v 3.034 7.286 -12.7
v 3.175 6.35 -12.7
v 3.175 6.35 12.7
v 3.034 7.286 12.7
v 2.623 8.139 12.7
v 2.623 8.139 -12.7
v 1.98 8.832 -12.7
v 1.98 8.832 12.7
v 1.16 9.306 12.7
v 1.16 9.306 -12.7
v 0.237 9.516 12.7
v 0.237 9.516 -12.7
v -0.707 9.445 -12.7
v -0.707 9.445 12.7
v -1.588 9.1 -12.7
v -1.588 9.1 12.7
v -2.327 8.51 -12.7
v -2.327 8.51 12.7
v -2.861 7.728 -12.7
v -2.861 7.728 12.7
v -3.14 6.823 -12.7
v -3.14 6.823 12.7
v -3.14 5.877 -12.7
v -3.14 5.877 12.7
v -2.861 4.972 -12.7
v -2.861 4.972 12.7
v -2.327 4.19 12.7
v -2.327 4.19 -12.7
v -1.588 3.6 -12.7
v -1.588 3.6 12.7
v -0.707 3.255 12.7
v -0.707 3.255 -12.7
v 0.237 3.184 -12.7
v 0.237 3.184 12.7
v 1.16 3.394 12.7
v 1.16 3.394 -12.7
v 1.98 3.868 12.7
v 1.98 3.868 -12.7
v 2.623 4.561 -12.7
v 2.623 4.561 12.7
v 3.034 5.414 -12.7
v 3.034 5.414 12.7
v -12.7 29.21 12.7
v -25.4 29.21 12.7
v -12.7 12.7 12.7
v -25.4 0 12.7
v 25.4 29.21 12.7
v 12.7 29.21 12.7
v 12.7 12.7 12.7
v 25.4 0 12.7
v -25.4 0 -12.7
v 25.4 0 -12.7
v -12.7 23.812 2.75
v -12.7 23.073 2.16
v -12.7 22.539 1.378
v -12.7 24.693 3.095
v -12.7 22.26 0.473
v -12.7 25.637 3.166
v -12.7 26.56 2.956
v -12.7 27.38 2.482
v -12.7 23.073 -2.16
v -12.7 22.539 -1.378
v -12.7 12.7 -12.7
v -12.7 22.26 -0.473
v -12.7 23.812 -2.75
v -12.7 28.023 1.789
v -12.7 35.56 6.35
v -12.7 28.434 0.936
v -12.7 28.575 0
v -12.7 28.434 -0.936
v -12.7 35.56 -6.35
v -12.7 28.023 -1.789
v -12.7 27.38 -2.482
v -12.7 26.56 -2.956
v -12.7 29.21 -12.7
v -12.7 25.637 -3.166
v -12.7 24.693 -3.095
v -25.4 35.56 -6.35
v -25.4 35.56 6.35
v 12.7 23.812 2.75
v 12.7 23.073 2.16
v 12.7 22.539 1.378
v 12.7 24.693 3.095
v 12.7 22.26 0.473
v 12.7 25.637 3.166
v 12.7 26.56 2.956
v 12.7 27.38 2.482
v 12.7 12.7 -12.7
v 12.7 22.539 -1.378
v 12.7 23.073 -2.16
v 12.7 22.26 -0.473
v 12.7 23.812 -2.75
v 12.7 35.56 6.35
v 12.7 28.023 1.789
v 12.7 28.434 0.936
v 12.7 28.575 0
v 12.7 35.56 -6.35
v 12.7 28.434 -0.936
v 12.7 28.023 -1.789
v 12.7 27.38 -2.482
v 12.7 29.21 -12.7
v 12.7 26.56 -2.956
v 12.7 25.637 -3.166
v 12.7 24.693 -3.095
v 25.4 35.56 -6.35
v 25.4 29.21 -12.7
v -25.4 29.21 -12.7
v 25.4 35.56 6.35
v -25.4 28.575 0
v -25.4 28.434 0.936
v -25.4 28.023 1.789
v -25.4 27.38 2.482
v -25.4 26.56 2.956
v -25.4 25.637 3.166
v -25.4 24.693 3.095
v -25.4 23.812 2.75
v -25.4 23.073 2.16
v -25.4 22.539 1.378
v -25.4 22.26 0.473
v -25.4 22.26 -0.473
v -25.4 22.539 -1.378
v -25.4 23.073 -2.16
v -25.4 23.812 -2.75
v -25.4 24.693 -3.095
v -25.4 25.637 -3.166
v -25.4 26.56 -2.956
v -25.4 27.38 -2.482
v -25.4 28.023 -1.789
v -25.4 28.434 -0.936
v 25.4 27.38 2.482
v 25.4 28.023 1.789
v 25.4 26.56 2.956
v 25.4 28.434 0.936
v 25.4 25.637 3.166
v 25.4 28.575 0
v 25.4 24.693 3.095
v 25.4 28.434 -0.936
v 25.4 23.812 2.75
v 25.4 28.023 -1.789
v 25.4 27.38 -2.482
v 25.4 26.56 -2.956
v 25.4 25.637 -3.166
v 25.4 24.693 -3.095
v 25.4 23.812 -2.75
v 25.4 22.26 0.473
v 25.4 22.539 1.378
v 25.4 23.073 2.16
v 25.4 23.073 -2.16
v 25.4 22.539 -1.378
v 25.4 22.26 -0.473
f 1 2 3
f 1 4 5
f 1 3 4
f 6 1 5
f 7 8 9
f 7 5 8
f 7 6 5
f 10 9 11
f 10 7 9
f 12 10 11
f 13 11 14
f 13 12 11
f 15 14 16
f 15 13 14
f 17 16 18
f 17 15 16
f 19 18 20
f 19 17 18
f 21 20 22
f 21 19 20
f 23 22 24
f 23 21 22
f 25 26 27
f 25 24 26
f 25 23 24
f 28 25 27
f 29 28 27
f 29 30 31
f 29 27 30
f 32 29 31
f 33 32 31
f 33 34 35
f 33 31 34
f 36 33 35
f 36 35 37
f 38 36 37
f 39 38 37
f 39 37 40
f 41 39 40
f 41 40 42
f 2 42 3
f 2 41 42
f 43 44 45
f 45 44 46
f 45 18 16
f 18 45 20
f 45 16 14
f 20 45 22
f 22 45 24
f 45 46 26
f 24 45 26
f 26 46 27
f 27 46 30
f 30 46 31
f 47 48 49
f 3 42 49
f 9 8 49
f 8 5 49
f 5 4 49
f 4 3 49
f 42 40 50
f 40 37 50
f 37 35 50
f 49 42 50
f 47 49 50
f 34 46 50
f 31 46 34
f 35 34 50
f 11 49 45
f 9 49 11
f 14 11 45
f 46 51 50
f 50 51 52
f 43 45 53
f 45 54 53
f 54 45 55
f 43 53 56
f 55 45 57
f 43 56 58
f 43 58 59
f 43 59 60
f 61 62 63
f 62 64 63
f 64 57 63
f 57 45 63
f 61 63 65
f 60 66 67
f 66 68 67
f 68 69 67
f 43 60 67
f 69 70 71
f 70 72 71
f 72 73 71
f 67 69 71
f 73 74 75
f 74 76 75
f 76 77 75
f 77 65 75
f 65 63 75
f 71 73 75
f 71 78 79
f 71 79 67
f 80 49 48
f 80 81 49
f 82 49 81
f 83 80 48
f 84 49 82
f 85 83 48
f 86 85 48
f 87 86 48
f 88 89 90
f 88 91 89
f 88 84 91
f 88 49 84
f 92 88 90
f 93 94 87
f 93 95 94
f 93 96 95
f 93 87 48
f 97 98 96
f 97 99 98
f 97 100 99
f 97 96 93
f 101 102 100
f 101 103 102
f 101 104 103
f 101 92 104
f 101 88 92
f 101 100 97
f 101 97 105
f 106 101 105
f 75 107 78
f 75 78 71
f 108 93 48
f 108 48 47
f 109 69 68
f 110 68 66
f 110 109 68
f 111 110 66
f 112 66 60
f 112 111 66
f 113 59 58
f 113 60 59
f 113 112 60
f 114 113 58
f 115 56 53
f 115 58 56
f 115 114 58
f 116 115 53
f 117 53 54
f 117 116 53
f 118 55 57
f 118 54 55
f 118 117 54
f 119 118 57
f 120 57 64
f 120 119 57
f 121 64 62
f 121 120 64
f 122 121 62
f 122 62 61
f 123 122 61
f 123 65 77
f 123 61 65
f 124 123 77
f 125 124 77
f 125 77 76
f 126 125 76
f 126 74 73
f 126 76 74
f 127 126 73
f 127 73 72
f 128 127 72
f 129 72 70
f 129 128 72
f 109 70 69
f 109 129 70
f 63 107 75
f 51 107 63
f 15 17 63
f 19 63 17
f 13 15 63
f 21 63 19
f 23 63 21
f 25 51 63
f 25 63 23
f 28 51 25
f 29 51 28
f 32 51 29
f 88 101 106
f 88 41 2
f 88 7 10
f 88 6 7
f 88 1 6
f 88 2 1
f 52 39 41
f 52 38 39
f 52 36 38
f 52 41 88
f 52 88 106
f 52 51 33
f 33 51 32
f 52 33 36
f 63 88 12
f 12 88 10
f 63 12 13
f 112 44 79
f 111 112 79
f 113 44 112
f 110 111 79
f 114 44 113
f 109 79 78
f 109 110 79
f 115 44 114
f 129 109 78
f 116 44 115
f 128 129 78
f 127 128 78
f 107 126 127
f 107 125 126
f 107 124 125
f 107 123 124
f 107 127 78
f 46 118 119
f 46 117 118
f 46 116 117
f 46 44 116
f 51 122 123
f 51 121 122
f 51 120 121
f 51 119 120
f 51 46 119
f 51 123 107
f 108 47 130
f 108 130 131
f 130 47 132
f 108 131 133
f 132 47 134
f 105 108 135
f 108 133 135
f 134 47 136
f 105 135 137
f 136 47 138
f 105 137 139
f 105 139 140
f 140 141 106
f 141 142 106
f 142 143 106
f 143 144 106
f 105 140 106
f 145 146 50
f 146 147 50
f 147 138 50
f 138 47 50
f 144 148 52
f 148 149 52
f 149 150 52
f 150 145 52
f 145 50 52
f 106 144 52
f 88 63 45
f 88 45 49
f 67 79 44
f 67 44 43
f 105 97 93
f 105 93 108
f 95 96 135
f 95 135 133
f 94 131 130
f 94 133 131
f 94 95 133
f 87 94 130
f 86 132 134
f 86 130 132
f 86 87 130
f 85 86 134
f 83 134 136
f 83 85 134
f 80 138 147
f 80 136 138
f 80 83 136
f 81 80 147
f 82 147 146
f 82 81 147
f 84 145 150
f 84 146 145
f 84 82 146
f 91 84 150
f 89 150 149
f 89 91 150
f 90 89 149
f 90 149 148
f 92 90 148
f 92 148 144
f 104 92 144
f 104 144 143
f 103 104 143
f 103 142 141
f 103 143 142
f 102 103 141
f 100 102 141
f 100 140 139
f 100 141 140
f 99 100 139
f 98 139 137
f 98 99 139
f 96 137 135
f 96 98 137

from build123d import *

# Parameters (mm, degrees)
SKETCH1_W               = 50.8
SKETCH1_H               = 25.4
BOSS_EXTRUDE1_DEPTH     = 35.56
CUT_EXTRUDE1_DEPTH      = 51.545361805
CUT_EXTRUDE1_DEPTH_BACK = 51.545361805
SKETCH2_R               = 3.175
SKETCH2_W               = 25.4
SKETCH2_H               = 22.86
CUT_EXTRUDE2_DEPTH      = 64.296473835
CUT_EXTRUDE2_DEPTH_BACK = 64.296473835
SKETCH3_R               = 3.175
CHAMFER2_SIZE           = 6.35


with BuildPart() as part:
    # Sketch1 → Boss-Extrude1 (new body)
    with BuildSketch(Plane(origin=(0, 0, 0), x_dir=(1, 0, 0), z_dir=(0, 1, 0))):
        Rectangle(SKETCH1_W, SKETCH1_H)
    extrude(amount=BOSS_EXTRUDE1_DEPTH)

    # Sketch2 → Cut-Extrude1 (cut, two sides: drawn at the far end of the back side and taken through both)
    with BuildSketch(Plane.XY.offset(12.7).offset(-CUT_EXTRUDE1_DEPTH_BACK)):
        with Locations((0, 6.35)):
            Circle(SKETCH2_R)
        with Locations((0, 24.13)):
            Rectangle(SKETCH2_W, SKETCH2_H)
    extrude(amount=CUT_EXTRUDE1_DEPTH + CUT_EXTRUDE1_DEPTH_BACK, mode=Mode.SUBTRACT)

    # Sketch3 → Cut-Extrude2 (cut, two sides: drawn at the far end of the back side and taken through both)
    with BuildSketch(Plane(origin=(25.4, 0, 0), x_dir=(0, 0, -1), z_dir=(1, 0, 0)).offset(-CUT_EXTRUDE2_DEPTH_BACK)):
        with Locations(Location((0, 25.4, 0), (0, 0, 90))):
            Circle(SKETCH3_R)
    extrude(amount=CUT_EXTRUDE2_DEPTH + CUT_EXTRUDE2_DEPTH_BACK, mode=Mode.SUBTRACT)

    # Chamfer2
    chamfer2_edges = [part.edges().sort_by_distance(p)[0] for p in [
        (19.05, 35.56, -12.7),
        (19.05, 35.56, 12.7),
        (-19.05, 35.56, -12.7),
        (-19.05, 35.56, 12.7),
    ]]
    chamfer(chamfer2_edges, length=CHAMFER2_SIZE)


solid = part.part
